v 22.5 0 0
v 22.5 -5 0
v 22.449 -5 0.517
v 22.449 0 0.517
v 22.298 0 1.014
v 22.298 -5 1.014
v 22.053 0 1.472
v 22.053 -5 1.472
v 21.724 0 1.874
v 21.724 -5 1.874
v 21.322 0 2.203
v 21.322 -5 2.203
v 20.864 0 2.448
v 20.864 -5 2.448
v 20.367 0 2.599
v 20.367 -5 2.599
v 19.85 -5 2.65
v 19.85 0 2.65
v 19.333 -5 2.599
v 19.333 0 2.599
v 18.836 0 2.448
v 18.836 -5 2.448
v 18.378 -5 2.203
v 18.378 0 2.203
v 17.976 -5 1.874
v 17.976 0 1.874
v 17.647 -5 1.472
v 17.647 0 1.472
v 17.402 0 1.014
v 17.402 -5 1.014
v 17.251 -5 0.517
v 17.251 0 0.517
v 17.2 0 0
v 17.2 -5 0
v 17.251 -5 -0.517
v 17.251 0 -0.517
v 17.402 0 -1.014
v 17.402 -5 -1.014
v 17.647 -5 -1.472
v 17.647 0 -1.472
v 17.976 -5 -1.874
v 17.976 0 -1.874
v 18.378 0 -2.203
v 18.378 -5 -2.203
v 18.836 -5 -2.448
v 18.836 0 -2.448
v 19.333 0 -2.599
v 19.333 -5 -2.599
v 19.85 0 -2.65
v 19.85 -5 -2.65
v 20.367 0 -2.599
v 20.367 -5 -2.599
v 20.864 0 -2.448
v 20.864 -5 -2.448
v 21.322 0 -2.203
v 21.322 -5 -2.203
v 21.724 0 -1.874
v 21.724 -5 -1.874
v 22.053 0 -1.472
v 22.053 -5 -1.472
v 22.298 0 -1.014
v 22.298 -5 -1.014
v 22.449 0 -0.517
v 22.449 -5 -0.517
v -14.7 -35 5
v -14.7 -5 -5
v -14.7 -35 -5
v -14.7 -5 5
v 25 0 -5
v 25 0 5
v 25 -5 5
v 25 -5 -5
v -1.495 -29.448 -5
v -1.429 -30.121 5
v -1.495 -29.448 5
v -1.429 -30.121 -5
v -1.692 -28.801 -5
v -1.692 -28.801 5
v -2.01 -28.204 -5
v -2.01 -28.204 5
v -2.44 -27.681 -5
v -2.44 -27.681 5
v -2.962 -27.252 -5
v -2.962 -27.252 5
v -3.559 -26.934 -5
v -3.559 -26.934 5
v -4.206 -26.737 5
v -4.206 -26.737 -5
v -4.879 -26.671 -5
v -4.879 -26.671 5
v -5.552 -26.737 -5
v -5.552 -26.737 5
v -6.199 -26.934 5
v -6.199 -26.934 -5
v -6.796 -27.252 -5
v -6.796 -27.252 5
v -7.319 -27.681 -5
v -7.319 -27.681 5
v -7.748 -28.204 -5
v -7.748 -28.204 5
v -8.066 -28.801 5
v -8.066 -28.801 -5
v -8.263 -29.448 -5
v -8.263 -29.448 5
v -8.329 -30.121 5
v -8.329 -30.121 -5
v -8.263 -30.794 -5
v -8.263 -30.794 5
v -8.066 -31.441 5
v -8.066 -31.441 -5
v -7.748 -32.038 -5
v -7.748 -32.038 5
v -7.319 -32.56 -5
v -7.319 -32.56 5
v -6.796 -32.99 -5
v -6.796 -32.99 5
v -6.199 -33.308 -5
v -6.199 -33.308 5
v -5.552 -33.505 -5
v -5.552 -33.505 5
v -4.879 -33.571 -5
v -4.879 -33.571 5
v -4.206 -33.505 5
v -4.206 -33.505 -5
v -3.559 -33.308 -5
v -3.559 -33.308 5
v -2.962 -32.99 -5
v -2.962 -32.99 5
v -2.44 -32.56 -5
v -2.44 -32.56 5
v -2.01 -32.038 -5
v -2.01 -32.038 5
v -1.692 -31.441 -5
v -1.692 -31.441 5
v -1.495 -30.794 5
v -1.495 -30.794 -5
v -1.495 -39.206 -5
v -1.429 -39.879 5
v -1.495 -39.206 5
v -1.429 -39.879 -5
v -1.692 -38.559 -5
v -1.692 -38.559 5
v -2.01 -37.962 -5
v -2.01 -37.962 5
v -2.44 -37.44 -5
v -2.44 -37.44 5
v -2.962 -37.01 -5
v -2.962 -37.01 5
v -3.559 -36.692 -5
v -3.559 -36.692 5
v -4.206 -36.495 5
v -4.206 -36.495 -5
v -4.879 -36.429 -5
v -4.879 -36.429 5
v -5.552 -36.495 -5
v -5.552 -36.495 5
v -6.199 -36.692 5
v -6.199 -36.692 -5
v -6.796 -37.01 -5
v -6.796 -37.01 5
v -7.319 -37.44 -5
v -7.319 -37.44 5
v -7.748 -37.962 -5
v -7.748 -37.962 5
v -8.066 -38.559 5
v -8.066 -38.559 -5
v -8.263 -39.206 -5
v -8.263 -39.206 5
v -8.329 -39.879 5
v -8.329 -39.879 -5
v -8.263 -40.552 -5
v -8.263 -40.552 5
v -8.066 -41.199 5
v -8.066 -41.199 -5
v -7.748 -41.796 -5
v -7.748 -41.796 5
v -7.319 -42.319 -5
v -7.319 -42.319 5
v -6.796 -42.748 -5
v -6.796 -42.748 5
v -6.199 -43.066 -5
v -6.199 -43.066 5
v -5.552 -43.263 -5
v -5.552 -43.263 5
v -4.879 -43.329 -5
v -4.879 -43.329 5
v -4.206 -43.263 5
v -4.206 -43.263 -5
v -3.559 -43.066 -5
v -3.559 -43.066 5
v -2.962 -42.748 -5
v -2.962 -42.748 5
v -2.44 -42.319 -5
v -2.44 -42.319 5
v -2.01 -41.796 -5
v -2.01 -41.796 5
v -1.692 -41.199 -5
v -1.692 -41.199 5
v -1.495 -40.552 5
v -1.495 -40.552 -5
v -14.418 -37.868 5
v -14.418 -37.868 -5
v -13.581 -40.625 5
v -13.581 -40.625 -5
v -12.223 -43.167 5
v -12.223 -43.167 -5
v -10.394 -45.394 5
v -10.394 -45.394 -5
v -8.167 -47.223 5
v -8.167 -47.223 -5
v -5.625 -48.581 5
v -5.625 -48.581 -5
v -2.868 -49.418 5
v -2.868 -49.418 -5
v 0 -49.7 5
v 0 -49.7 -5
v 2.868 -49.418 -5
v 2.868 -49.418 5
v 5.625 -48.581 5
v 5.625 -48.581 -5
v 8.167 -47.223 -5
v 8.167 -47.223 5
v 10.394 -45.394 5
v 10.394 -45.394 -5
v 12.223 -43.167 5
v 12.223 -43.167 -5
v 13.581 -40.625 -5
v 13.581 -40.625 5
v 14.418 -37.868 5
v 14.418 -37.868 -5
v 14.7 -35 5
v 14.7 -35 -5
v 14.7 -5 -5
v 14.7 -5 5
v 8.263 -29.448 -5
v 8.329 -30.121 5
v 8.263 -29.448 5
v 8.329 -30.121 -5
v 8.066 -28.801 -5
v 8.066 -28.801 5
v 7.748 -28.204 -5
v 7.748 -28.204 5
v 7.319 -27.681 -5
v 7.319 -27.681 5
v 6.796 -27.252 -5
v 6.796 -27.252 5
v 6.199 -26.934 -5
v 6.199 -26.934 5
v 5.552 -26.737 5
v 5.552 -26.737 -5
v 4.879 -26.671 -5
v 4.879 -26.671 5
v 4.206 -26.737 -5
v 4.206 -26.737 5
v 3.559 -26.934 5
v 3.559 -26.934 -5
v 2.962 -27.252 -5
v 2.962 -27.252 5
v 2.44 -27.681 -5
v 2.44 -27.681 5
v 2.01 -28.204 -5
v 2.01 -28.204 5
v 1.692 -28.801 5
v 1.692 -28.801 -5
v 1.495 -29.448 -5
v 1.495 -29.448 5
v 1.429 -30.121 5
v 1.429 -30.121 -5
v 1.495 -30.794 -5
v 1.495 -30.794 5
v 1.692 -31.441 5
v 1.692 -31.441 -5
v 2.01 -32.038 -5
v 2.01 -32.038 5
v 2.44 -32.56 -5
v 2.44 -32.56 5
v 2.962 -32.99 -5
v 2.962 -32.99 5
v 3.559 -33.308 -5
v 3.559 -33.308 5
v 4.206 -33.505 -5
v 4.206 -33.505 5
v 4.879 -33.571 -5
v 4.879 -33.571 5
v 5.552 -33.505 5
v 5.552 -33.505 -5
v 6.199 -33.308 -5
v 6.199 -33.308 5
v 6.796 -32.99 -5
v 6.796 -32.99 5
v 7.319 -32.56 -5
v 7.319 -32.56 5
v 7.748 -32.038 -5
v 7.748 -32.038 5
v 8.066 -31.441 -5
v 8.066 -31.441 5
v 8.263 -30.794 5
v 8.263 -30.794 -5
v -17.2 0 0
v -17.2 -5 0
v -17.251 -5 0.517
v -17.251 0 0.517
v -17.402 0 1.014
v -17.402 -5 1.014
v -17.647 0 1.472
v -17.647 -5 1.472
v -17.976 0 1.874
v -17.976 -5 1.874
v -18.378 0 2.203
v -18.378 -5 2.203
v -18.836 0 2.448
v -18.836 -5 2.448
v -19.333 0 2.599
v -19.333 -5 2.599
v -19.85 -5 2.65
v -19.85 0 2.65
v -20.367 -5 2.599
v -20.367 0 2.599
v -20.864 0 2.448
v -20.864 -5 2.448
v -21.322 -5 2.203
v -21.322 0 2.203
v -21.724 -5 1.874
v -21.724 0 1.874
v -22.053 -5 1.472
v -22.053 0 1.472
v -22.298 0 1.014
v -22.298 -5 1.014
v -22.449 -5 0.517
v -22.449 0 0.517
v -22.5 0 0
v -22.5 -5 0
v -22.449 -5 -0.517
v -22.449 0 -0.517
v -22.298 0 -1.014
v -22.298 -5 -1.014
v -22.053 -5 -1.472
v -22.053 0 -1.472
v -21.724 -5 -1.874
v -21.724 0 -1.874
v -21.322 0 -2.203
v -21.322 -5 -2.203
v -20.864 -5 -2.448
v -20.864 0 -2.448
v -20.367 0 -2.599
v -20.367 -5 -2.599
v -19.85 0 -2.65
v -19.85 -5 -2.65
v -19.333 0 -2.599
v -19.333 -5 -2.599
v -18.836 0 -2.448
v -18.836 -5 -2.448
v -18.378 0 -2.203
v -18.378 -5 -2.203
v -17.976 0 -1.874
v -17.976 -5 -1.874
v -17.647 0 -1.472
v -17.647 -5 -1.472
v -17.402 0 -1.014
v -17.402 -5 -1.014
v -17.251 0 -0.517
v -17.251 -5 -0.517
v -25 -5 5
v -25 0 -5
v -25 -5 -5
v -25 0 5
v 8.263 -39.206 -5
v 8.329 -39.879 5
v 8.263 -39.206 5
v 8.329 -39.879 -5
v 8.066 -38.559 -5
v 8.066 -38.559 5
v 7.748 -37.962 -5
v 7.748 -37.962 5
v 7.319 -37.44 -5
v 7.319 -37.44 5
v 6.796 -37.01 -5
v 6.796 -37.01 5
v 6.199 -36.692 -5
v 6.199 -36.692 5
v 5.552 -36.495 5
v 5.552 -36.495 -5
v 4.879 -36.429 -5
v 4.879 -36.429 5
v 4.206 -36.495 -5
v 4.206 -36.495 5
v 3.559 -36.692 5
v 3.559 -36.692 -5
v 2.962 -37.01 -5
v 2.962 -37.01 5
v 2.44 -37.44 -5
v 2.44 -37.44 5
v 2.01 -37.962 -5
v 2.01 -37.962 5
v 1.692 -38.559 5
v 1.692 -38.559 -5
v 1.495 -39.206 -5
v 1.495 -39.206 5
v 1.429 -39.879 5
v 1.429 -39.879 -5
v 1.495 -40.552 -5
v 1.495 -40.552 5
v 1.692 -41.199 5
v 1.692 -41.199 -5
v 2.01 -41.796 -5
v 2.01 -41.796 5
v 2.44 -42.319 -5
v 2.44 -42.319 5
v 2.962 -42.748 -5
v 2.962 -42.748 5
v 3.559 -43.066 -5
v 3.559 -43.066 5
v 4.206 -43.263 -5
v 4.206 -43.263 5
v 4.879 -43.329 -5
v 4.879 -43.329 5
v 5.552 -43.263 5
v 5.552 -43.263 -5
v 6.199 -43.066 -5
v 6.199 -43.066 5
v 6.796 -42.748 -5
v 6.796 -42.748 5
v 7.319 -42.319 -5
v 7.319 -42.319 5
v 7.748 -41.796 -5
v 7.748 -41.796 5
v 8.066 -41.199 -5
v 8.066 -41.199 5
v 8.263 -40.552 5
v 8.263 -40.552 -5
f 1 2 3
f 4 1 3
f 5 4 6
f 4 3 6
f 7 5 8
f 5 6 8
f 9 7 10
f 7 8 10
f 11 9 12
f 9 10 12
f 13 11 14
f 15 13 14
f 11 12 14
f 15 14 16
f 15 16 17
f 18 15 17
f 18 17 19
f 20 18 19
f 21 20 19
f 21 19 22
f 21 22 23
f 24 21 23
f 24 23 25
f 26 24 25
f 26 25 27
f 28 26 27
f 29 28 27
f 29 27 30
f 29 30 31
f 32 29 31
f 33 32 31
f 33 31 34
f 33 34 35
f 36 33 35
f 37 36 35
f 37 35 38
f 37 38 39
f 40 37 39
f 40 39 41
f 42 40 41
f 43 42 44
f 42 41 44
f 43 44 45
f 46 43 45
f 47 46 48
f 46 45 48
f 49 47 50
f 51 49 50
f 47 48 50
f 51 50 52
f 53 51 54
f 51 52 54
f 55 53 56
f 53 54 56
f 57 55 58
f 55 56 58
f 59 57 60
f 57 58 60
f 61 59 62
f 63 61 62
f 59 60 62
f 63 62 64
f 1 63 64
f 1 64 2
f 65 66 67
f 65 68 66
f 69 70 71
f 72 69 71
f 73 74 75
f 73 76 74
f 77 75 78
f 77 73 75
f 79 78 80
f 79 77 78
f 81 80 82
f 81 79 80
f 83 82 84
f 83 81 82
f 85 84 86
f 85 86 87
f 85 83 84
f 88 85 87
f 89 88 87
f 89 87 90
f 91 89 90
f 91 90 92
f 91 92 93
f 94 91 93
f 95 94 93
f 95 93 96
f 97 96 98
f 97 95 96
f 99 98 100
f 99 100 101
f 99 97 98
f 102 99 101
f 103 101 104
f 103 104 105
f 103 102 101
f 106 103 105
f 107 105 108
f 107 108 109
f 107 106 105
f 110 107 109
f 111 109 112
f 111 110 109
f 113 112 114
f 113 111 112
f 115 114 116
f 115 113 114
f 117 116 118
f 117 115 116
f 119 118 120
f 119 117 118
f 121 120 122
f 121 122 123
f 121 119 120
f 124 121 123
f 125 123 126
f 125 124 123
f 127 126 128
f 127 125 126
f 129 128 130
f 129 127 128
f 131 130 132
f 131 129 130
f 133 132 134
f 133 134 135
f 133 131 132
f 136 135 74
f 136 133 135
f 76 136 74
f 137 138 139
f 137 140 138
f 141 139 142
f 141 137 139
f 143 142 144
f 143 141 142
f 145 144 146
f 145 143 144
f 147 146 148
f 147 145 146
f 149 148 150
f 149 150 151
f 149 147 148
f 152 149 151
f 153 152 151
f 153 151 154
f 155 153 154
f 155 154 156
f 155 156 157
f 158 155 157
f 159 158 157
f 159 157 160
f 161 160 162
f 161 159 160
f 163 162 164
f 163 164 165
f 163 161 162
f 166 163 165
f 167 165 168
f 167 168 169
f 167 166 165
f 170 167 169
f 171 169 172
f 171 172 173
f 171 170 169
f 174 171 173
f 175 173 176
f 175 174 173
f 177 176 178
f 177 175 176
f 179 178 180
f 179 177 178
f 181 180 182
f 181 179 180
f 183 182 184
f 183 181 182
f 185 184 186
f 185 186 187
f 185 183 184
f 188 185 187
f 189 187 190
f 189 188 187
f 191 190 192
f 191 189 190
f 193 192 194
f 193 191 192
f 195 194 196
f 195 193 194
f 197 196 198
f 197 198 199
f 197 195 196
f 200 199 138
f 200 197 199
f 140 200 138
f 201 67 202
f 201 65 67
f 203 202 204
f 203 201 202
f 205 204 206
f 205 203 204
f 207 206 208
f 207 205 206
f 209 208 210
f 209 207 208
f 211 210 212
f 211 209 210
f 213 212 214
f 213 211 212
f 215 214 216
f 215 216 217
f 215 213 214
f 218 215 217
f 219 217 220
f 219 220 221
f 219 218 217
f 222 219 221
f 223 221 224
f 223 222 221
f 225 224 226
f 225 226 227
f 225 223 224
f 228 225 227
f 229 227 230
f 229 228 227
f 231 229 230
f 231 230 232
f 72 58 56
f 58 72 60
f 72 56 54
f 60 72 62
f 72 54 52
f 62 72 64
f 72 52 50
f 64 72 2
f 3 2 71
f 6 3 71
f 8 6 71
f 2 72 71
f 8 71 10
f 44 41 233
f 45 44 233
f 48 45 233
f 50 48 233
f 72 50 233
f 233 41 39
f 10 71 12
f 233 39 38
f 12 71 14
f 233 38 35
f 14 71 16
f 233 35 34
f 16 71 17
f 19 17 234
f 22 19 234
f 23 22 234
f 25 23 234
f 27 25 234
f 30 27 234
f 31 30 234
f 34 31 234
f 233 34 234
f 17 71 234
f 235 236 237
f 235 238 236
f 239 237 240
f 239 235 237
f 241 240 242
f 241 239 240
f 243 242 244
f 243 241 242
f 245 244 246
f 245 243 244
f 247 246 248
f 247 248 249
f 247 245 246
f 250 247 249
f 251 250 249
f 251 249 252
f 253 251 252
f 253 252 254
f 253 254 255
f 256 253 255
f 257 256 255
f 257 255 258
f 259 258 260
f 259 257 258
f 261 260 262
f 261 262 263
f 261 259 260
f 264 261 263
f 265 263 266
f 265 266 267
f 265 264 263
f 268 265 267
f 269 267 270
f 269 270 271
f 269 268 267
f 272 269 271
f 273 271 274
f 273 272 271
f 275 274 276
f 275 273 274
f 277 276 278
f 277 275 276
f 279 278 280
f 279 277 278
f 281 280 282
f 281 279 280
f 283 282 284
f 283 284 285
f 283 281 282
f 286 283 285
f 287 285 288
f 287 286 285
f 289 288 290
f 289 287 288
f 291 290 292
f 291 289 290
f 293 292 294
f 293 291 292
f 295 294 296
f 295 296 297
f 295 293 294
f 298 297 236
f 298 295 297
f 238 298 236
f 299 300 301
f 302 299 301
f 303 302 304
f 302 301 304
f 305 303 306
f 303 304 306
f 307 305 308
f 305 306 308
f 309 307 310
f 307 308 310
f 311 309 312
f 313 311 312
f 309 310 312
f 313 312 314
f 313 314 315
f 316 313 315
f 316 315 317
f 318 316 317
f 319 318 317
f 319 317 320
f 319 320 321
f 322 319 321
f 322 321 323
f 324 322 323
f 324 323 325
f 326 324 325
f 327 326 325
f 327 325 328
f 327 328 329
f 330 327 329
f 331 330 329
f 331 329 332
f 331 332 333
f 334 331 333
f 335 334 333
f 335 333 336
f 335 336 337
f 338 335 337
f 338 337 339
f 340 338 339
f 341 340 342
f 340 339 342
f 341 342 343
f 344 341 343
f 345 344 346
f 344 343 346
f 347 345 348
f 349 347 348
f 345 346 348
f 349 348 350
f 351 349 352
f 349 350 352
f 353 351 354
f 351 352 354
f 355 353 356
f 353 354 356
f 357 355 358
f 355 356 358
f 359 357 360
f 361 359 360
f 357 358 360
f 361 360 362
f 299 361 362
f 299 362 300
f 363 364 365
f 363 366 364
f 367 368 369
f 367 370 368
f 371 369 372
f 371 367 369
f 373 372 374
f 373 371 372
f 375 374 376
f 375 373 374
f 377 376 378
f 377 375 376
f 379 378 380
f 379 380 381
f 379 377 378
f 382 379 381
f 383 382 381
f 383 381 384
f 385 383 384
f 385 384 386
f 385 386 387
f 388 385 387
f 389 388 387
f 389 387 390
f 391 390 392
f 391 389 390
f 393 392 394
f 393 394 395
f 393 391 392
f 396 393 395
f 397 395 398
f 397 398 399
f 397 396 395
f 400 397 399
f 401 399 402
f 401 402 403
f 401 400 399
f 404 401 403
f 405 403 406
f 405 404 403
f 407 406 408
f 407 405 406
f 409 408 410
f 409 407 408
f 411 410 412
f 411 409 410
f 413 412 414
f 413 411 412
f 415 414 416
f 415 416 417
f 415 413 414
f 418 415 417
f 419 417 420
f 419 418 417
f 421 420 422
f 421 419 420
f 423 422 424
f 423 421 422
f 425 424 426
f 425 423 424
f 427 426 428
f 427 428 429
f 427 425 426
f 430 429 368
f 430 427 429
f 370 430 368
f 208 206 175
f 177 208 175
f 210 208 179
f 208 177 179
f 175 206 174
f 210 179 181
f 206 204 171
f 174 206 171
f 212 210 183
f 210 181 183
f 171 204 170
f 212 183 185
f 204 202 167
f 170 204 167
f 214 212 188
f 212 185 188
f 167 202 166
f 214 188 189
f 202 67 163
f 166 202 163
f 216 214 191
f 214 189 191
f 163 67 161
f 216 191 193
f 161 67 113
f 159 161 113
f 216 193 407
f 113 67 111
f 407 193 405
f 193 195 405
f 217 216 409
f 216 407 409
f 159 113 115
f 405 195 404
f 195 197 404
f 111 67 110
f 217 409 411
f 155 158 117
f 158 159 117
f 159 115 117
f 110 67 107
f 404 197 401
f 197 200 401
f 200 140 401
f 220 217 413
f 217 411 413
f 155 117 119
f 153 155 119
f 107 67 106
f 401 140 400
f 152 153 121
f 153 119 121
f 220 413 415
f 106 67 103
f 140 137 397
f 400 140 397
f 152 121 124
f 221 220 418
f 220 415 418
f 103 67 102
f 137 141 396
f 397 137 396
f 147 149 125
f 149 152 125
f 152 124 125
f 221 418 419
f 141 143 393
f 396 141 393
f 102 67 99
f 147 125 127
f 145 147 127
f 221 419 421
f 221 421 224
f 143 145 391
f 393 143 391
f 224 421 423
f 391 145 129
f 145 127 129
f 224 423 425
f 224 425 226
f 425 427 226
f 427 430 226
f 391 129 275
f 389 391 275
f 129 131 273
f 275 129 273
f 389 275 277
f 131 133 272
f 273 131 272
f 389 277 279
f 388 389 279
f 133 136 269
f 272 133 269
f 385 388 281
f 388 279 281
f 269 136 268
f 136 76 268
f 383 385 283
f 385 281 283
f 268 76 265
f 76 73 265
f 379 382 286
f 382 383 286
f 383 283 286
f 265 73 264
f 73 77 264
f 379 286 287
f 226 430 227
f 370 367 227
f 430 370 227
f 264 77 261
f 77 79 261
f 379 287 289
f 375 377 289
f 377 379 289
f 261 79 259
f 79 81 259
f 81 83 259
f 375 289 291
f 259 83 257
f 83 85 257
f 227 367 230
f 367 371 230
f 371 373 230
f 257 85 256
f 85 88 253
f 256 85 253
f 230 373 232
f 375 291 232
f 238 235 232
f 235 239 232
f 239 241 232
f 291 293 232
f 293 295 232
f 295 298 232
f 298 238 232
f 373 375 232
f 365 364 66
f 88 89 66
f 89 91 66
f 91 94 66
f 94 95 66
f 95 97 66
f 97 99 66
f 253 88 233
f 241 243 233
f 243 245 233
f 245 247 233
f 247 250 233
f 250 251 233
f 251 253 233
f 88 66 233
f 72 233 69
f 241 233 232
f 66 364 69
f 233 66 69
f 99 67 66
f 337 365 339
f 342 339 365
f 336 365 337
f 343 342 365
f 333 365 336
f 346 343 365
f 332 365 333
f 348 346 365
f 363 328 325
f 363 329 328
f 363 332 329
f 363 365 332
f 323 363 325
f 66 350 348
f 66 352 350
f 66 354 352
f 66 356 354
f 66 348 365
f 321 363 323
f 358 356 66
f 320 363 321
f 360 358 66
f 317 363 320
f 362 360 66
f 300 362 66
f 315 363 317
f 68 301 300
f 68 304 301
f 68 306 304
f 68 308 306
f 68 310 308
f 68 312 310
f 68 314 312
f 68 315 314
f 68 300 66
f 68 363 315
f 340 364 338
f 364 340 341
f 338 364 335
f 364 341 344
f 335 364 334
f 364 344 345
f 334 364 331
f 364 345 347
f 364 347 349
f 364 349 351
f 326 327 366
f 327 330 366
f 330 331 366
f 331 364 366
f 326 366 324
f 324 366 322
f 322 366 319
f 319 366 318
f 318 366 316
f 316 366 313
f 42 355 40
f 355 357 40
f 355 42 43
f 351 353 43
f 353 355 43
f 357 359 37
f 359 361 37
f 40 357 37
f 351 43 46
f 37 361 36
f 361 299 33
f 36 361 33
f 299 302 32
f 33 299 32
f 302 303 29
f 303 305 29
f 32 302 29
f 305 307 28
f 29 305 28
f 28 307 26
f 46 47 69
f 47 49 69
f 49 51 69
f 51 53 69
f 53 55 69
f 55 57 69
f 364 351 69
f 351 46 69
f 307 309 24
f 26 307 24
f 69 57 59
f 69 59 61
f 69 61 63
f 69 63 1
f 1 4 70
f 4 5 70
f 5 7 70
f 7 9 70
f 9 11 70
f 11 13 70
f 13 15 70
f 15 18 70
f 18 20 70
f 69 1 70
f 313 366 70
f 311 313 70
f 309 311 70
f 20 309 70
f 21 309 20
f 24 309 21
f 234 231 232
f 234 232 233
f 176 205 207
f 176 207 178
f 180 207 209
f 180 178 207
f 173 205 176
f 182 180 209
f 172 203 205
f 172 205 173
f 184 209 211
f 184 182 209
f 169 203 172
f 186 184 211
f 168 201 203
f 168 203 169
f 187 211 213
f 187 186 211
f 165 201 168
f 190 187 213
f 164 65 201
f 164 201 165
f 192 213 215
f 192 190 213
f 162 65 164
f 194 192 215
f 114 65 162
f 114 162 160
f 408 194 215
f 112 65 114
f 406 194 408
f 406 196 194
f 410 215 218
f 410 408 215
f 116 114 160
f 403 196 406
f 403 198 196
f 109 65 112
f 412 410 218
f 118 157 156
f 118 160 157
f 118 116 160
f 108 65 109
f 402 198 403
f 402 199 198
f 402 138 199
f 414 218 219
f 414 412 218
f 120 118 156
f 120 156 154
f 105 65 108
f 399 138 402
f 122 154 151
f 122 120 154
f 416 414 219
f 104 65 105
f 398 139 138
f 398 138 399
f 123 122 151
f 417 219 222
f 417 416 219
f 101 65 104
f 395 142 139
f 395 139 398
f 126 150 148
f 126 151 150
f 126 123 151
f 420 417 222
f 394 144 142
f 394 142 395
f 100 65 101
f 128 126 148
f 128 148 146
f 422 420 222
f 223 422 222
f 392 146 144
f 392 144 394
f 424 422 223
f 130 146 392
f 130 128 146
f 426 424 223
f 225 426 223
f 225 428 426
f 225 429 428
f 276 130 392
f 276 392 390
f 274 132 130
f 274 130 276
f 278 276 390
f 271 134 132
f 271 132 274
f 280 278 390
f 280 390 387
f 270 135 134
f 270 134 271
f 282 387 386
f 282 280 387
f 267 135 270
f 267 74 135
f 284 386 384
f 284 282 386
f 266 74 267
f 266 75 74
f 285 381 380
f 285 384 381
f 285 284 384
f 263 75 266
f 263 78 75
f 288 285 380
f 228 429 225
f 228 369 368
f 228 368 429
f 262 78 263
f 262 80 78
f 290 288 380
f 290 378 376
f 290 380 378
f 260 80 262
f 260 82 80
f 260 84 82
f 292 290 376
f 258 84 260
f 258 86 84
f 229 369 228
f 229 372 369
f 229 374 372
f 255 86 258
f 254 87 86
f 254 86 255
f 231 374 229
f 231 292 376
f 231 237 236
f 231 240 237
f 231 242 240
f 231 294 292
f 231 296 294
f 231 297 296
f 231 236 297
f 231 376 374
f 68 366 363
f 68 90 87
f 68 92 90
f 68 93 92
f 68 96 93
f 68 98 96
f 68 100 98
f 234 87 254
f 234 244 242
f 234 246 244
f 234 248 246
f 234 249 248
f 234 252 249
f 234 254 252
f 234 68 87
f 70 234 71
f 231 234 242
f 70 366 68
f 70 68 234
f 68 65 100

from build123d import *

# Parameters (mm, degrees)
SKETCH_R    = 3.45
PAD_DEPTH   = 5
SKETCH001_R = 2.65
HOLE_DEPTH  = 5.001


with BuildPart() as part:
    # Sketch → Pad (new body, symmetric)
    with BuildSketch(Plane.XY):
        with BuildLine():
            ThreePointArc((-14.7, -35), (0, -49.7), (14.7, -35))
            Line((14.7, -35), (14.7, -5))
            Line((25, -5), (14.7, -5))
            Line((25, 0), (25, -5))
            Line((-25, 0), (25, 0))
            Line((-25, 0), (-25, -5))
            Line((-25, -5), (-14.7, -5))
            Line((-14.7, -5), (-14.7, -35))
        make_face()
        with Locations((-4.879037, -30.120963)):
            Circle(SKETCH_R, mode=Mode.SUBTRACT)
        with Locations((4.879037, -30.120963)):
            Circle(SKETCH_R, mode=Mode.SUBTRACT)
        with Locations((4.879037, -39.879037)):
            Circle(SKETCH_R, mode=Mode.SUBTRACT)
        with Locations((-4.879037, -39.879037)):
            Circle(SKETCH_R, mode=Mode.SUBTRACT)
    extrude(amount=PAD_DEPTH, both=True)

    # Sketch001 → Hole (cut, through all)
    with BuildSketch(Plane.XZ.offset(5)):
        with Locations((-19.85, 0)):
            Circle(SKETCH001_R)
        with Locations((19.85, 0)):
            Circle(SKETCH001_R)
    extrude(amount=-HOLE_DEPTH, mode=Mode.SUBTRACT)


solid = part.part
